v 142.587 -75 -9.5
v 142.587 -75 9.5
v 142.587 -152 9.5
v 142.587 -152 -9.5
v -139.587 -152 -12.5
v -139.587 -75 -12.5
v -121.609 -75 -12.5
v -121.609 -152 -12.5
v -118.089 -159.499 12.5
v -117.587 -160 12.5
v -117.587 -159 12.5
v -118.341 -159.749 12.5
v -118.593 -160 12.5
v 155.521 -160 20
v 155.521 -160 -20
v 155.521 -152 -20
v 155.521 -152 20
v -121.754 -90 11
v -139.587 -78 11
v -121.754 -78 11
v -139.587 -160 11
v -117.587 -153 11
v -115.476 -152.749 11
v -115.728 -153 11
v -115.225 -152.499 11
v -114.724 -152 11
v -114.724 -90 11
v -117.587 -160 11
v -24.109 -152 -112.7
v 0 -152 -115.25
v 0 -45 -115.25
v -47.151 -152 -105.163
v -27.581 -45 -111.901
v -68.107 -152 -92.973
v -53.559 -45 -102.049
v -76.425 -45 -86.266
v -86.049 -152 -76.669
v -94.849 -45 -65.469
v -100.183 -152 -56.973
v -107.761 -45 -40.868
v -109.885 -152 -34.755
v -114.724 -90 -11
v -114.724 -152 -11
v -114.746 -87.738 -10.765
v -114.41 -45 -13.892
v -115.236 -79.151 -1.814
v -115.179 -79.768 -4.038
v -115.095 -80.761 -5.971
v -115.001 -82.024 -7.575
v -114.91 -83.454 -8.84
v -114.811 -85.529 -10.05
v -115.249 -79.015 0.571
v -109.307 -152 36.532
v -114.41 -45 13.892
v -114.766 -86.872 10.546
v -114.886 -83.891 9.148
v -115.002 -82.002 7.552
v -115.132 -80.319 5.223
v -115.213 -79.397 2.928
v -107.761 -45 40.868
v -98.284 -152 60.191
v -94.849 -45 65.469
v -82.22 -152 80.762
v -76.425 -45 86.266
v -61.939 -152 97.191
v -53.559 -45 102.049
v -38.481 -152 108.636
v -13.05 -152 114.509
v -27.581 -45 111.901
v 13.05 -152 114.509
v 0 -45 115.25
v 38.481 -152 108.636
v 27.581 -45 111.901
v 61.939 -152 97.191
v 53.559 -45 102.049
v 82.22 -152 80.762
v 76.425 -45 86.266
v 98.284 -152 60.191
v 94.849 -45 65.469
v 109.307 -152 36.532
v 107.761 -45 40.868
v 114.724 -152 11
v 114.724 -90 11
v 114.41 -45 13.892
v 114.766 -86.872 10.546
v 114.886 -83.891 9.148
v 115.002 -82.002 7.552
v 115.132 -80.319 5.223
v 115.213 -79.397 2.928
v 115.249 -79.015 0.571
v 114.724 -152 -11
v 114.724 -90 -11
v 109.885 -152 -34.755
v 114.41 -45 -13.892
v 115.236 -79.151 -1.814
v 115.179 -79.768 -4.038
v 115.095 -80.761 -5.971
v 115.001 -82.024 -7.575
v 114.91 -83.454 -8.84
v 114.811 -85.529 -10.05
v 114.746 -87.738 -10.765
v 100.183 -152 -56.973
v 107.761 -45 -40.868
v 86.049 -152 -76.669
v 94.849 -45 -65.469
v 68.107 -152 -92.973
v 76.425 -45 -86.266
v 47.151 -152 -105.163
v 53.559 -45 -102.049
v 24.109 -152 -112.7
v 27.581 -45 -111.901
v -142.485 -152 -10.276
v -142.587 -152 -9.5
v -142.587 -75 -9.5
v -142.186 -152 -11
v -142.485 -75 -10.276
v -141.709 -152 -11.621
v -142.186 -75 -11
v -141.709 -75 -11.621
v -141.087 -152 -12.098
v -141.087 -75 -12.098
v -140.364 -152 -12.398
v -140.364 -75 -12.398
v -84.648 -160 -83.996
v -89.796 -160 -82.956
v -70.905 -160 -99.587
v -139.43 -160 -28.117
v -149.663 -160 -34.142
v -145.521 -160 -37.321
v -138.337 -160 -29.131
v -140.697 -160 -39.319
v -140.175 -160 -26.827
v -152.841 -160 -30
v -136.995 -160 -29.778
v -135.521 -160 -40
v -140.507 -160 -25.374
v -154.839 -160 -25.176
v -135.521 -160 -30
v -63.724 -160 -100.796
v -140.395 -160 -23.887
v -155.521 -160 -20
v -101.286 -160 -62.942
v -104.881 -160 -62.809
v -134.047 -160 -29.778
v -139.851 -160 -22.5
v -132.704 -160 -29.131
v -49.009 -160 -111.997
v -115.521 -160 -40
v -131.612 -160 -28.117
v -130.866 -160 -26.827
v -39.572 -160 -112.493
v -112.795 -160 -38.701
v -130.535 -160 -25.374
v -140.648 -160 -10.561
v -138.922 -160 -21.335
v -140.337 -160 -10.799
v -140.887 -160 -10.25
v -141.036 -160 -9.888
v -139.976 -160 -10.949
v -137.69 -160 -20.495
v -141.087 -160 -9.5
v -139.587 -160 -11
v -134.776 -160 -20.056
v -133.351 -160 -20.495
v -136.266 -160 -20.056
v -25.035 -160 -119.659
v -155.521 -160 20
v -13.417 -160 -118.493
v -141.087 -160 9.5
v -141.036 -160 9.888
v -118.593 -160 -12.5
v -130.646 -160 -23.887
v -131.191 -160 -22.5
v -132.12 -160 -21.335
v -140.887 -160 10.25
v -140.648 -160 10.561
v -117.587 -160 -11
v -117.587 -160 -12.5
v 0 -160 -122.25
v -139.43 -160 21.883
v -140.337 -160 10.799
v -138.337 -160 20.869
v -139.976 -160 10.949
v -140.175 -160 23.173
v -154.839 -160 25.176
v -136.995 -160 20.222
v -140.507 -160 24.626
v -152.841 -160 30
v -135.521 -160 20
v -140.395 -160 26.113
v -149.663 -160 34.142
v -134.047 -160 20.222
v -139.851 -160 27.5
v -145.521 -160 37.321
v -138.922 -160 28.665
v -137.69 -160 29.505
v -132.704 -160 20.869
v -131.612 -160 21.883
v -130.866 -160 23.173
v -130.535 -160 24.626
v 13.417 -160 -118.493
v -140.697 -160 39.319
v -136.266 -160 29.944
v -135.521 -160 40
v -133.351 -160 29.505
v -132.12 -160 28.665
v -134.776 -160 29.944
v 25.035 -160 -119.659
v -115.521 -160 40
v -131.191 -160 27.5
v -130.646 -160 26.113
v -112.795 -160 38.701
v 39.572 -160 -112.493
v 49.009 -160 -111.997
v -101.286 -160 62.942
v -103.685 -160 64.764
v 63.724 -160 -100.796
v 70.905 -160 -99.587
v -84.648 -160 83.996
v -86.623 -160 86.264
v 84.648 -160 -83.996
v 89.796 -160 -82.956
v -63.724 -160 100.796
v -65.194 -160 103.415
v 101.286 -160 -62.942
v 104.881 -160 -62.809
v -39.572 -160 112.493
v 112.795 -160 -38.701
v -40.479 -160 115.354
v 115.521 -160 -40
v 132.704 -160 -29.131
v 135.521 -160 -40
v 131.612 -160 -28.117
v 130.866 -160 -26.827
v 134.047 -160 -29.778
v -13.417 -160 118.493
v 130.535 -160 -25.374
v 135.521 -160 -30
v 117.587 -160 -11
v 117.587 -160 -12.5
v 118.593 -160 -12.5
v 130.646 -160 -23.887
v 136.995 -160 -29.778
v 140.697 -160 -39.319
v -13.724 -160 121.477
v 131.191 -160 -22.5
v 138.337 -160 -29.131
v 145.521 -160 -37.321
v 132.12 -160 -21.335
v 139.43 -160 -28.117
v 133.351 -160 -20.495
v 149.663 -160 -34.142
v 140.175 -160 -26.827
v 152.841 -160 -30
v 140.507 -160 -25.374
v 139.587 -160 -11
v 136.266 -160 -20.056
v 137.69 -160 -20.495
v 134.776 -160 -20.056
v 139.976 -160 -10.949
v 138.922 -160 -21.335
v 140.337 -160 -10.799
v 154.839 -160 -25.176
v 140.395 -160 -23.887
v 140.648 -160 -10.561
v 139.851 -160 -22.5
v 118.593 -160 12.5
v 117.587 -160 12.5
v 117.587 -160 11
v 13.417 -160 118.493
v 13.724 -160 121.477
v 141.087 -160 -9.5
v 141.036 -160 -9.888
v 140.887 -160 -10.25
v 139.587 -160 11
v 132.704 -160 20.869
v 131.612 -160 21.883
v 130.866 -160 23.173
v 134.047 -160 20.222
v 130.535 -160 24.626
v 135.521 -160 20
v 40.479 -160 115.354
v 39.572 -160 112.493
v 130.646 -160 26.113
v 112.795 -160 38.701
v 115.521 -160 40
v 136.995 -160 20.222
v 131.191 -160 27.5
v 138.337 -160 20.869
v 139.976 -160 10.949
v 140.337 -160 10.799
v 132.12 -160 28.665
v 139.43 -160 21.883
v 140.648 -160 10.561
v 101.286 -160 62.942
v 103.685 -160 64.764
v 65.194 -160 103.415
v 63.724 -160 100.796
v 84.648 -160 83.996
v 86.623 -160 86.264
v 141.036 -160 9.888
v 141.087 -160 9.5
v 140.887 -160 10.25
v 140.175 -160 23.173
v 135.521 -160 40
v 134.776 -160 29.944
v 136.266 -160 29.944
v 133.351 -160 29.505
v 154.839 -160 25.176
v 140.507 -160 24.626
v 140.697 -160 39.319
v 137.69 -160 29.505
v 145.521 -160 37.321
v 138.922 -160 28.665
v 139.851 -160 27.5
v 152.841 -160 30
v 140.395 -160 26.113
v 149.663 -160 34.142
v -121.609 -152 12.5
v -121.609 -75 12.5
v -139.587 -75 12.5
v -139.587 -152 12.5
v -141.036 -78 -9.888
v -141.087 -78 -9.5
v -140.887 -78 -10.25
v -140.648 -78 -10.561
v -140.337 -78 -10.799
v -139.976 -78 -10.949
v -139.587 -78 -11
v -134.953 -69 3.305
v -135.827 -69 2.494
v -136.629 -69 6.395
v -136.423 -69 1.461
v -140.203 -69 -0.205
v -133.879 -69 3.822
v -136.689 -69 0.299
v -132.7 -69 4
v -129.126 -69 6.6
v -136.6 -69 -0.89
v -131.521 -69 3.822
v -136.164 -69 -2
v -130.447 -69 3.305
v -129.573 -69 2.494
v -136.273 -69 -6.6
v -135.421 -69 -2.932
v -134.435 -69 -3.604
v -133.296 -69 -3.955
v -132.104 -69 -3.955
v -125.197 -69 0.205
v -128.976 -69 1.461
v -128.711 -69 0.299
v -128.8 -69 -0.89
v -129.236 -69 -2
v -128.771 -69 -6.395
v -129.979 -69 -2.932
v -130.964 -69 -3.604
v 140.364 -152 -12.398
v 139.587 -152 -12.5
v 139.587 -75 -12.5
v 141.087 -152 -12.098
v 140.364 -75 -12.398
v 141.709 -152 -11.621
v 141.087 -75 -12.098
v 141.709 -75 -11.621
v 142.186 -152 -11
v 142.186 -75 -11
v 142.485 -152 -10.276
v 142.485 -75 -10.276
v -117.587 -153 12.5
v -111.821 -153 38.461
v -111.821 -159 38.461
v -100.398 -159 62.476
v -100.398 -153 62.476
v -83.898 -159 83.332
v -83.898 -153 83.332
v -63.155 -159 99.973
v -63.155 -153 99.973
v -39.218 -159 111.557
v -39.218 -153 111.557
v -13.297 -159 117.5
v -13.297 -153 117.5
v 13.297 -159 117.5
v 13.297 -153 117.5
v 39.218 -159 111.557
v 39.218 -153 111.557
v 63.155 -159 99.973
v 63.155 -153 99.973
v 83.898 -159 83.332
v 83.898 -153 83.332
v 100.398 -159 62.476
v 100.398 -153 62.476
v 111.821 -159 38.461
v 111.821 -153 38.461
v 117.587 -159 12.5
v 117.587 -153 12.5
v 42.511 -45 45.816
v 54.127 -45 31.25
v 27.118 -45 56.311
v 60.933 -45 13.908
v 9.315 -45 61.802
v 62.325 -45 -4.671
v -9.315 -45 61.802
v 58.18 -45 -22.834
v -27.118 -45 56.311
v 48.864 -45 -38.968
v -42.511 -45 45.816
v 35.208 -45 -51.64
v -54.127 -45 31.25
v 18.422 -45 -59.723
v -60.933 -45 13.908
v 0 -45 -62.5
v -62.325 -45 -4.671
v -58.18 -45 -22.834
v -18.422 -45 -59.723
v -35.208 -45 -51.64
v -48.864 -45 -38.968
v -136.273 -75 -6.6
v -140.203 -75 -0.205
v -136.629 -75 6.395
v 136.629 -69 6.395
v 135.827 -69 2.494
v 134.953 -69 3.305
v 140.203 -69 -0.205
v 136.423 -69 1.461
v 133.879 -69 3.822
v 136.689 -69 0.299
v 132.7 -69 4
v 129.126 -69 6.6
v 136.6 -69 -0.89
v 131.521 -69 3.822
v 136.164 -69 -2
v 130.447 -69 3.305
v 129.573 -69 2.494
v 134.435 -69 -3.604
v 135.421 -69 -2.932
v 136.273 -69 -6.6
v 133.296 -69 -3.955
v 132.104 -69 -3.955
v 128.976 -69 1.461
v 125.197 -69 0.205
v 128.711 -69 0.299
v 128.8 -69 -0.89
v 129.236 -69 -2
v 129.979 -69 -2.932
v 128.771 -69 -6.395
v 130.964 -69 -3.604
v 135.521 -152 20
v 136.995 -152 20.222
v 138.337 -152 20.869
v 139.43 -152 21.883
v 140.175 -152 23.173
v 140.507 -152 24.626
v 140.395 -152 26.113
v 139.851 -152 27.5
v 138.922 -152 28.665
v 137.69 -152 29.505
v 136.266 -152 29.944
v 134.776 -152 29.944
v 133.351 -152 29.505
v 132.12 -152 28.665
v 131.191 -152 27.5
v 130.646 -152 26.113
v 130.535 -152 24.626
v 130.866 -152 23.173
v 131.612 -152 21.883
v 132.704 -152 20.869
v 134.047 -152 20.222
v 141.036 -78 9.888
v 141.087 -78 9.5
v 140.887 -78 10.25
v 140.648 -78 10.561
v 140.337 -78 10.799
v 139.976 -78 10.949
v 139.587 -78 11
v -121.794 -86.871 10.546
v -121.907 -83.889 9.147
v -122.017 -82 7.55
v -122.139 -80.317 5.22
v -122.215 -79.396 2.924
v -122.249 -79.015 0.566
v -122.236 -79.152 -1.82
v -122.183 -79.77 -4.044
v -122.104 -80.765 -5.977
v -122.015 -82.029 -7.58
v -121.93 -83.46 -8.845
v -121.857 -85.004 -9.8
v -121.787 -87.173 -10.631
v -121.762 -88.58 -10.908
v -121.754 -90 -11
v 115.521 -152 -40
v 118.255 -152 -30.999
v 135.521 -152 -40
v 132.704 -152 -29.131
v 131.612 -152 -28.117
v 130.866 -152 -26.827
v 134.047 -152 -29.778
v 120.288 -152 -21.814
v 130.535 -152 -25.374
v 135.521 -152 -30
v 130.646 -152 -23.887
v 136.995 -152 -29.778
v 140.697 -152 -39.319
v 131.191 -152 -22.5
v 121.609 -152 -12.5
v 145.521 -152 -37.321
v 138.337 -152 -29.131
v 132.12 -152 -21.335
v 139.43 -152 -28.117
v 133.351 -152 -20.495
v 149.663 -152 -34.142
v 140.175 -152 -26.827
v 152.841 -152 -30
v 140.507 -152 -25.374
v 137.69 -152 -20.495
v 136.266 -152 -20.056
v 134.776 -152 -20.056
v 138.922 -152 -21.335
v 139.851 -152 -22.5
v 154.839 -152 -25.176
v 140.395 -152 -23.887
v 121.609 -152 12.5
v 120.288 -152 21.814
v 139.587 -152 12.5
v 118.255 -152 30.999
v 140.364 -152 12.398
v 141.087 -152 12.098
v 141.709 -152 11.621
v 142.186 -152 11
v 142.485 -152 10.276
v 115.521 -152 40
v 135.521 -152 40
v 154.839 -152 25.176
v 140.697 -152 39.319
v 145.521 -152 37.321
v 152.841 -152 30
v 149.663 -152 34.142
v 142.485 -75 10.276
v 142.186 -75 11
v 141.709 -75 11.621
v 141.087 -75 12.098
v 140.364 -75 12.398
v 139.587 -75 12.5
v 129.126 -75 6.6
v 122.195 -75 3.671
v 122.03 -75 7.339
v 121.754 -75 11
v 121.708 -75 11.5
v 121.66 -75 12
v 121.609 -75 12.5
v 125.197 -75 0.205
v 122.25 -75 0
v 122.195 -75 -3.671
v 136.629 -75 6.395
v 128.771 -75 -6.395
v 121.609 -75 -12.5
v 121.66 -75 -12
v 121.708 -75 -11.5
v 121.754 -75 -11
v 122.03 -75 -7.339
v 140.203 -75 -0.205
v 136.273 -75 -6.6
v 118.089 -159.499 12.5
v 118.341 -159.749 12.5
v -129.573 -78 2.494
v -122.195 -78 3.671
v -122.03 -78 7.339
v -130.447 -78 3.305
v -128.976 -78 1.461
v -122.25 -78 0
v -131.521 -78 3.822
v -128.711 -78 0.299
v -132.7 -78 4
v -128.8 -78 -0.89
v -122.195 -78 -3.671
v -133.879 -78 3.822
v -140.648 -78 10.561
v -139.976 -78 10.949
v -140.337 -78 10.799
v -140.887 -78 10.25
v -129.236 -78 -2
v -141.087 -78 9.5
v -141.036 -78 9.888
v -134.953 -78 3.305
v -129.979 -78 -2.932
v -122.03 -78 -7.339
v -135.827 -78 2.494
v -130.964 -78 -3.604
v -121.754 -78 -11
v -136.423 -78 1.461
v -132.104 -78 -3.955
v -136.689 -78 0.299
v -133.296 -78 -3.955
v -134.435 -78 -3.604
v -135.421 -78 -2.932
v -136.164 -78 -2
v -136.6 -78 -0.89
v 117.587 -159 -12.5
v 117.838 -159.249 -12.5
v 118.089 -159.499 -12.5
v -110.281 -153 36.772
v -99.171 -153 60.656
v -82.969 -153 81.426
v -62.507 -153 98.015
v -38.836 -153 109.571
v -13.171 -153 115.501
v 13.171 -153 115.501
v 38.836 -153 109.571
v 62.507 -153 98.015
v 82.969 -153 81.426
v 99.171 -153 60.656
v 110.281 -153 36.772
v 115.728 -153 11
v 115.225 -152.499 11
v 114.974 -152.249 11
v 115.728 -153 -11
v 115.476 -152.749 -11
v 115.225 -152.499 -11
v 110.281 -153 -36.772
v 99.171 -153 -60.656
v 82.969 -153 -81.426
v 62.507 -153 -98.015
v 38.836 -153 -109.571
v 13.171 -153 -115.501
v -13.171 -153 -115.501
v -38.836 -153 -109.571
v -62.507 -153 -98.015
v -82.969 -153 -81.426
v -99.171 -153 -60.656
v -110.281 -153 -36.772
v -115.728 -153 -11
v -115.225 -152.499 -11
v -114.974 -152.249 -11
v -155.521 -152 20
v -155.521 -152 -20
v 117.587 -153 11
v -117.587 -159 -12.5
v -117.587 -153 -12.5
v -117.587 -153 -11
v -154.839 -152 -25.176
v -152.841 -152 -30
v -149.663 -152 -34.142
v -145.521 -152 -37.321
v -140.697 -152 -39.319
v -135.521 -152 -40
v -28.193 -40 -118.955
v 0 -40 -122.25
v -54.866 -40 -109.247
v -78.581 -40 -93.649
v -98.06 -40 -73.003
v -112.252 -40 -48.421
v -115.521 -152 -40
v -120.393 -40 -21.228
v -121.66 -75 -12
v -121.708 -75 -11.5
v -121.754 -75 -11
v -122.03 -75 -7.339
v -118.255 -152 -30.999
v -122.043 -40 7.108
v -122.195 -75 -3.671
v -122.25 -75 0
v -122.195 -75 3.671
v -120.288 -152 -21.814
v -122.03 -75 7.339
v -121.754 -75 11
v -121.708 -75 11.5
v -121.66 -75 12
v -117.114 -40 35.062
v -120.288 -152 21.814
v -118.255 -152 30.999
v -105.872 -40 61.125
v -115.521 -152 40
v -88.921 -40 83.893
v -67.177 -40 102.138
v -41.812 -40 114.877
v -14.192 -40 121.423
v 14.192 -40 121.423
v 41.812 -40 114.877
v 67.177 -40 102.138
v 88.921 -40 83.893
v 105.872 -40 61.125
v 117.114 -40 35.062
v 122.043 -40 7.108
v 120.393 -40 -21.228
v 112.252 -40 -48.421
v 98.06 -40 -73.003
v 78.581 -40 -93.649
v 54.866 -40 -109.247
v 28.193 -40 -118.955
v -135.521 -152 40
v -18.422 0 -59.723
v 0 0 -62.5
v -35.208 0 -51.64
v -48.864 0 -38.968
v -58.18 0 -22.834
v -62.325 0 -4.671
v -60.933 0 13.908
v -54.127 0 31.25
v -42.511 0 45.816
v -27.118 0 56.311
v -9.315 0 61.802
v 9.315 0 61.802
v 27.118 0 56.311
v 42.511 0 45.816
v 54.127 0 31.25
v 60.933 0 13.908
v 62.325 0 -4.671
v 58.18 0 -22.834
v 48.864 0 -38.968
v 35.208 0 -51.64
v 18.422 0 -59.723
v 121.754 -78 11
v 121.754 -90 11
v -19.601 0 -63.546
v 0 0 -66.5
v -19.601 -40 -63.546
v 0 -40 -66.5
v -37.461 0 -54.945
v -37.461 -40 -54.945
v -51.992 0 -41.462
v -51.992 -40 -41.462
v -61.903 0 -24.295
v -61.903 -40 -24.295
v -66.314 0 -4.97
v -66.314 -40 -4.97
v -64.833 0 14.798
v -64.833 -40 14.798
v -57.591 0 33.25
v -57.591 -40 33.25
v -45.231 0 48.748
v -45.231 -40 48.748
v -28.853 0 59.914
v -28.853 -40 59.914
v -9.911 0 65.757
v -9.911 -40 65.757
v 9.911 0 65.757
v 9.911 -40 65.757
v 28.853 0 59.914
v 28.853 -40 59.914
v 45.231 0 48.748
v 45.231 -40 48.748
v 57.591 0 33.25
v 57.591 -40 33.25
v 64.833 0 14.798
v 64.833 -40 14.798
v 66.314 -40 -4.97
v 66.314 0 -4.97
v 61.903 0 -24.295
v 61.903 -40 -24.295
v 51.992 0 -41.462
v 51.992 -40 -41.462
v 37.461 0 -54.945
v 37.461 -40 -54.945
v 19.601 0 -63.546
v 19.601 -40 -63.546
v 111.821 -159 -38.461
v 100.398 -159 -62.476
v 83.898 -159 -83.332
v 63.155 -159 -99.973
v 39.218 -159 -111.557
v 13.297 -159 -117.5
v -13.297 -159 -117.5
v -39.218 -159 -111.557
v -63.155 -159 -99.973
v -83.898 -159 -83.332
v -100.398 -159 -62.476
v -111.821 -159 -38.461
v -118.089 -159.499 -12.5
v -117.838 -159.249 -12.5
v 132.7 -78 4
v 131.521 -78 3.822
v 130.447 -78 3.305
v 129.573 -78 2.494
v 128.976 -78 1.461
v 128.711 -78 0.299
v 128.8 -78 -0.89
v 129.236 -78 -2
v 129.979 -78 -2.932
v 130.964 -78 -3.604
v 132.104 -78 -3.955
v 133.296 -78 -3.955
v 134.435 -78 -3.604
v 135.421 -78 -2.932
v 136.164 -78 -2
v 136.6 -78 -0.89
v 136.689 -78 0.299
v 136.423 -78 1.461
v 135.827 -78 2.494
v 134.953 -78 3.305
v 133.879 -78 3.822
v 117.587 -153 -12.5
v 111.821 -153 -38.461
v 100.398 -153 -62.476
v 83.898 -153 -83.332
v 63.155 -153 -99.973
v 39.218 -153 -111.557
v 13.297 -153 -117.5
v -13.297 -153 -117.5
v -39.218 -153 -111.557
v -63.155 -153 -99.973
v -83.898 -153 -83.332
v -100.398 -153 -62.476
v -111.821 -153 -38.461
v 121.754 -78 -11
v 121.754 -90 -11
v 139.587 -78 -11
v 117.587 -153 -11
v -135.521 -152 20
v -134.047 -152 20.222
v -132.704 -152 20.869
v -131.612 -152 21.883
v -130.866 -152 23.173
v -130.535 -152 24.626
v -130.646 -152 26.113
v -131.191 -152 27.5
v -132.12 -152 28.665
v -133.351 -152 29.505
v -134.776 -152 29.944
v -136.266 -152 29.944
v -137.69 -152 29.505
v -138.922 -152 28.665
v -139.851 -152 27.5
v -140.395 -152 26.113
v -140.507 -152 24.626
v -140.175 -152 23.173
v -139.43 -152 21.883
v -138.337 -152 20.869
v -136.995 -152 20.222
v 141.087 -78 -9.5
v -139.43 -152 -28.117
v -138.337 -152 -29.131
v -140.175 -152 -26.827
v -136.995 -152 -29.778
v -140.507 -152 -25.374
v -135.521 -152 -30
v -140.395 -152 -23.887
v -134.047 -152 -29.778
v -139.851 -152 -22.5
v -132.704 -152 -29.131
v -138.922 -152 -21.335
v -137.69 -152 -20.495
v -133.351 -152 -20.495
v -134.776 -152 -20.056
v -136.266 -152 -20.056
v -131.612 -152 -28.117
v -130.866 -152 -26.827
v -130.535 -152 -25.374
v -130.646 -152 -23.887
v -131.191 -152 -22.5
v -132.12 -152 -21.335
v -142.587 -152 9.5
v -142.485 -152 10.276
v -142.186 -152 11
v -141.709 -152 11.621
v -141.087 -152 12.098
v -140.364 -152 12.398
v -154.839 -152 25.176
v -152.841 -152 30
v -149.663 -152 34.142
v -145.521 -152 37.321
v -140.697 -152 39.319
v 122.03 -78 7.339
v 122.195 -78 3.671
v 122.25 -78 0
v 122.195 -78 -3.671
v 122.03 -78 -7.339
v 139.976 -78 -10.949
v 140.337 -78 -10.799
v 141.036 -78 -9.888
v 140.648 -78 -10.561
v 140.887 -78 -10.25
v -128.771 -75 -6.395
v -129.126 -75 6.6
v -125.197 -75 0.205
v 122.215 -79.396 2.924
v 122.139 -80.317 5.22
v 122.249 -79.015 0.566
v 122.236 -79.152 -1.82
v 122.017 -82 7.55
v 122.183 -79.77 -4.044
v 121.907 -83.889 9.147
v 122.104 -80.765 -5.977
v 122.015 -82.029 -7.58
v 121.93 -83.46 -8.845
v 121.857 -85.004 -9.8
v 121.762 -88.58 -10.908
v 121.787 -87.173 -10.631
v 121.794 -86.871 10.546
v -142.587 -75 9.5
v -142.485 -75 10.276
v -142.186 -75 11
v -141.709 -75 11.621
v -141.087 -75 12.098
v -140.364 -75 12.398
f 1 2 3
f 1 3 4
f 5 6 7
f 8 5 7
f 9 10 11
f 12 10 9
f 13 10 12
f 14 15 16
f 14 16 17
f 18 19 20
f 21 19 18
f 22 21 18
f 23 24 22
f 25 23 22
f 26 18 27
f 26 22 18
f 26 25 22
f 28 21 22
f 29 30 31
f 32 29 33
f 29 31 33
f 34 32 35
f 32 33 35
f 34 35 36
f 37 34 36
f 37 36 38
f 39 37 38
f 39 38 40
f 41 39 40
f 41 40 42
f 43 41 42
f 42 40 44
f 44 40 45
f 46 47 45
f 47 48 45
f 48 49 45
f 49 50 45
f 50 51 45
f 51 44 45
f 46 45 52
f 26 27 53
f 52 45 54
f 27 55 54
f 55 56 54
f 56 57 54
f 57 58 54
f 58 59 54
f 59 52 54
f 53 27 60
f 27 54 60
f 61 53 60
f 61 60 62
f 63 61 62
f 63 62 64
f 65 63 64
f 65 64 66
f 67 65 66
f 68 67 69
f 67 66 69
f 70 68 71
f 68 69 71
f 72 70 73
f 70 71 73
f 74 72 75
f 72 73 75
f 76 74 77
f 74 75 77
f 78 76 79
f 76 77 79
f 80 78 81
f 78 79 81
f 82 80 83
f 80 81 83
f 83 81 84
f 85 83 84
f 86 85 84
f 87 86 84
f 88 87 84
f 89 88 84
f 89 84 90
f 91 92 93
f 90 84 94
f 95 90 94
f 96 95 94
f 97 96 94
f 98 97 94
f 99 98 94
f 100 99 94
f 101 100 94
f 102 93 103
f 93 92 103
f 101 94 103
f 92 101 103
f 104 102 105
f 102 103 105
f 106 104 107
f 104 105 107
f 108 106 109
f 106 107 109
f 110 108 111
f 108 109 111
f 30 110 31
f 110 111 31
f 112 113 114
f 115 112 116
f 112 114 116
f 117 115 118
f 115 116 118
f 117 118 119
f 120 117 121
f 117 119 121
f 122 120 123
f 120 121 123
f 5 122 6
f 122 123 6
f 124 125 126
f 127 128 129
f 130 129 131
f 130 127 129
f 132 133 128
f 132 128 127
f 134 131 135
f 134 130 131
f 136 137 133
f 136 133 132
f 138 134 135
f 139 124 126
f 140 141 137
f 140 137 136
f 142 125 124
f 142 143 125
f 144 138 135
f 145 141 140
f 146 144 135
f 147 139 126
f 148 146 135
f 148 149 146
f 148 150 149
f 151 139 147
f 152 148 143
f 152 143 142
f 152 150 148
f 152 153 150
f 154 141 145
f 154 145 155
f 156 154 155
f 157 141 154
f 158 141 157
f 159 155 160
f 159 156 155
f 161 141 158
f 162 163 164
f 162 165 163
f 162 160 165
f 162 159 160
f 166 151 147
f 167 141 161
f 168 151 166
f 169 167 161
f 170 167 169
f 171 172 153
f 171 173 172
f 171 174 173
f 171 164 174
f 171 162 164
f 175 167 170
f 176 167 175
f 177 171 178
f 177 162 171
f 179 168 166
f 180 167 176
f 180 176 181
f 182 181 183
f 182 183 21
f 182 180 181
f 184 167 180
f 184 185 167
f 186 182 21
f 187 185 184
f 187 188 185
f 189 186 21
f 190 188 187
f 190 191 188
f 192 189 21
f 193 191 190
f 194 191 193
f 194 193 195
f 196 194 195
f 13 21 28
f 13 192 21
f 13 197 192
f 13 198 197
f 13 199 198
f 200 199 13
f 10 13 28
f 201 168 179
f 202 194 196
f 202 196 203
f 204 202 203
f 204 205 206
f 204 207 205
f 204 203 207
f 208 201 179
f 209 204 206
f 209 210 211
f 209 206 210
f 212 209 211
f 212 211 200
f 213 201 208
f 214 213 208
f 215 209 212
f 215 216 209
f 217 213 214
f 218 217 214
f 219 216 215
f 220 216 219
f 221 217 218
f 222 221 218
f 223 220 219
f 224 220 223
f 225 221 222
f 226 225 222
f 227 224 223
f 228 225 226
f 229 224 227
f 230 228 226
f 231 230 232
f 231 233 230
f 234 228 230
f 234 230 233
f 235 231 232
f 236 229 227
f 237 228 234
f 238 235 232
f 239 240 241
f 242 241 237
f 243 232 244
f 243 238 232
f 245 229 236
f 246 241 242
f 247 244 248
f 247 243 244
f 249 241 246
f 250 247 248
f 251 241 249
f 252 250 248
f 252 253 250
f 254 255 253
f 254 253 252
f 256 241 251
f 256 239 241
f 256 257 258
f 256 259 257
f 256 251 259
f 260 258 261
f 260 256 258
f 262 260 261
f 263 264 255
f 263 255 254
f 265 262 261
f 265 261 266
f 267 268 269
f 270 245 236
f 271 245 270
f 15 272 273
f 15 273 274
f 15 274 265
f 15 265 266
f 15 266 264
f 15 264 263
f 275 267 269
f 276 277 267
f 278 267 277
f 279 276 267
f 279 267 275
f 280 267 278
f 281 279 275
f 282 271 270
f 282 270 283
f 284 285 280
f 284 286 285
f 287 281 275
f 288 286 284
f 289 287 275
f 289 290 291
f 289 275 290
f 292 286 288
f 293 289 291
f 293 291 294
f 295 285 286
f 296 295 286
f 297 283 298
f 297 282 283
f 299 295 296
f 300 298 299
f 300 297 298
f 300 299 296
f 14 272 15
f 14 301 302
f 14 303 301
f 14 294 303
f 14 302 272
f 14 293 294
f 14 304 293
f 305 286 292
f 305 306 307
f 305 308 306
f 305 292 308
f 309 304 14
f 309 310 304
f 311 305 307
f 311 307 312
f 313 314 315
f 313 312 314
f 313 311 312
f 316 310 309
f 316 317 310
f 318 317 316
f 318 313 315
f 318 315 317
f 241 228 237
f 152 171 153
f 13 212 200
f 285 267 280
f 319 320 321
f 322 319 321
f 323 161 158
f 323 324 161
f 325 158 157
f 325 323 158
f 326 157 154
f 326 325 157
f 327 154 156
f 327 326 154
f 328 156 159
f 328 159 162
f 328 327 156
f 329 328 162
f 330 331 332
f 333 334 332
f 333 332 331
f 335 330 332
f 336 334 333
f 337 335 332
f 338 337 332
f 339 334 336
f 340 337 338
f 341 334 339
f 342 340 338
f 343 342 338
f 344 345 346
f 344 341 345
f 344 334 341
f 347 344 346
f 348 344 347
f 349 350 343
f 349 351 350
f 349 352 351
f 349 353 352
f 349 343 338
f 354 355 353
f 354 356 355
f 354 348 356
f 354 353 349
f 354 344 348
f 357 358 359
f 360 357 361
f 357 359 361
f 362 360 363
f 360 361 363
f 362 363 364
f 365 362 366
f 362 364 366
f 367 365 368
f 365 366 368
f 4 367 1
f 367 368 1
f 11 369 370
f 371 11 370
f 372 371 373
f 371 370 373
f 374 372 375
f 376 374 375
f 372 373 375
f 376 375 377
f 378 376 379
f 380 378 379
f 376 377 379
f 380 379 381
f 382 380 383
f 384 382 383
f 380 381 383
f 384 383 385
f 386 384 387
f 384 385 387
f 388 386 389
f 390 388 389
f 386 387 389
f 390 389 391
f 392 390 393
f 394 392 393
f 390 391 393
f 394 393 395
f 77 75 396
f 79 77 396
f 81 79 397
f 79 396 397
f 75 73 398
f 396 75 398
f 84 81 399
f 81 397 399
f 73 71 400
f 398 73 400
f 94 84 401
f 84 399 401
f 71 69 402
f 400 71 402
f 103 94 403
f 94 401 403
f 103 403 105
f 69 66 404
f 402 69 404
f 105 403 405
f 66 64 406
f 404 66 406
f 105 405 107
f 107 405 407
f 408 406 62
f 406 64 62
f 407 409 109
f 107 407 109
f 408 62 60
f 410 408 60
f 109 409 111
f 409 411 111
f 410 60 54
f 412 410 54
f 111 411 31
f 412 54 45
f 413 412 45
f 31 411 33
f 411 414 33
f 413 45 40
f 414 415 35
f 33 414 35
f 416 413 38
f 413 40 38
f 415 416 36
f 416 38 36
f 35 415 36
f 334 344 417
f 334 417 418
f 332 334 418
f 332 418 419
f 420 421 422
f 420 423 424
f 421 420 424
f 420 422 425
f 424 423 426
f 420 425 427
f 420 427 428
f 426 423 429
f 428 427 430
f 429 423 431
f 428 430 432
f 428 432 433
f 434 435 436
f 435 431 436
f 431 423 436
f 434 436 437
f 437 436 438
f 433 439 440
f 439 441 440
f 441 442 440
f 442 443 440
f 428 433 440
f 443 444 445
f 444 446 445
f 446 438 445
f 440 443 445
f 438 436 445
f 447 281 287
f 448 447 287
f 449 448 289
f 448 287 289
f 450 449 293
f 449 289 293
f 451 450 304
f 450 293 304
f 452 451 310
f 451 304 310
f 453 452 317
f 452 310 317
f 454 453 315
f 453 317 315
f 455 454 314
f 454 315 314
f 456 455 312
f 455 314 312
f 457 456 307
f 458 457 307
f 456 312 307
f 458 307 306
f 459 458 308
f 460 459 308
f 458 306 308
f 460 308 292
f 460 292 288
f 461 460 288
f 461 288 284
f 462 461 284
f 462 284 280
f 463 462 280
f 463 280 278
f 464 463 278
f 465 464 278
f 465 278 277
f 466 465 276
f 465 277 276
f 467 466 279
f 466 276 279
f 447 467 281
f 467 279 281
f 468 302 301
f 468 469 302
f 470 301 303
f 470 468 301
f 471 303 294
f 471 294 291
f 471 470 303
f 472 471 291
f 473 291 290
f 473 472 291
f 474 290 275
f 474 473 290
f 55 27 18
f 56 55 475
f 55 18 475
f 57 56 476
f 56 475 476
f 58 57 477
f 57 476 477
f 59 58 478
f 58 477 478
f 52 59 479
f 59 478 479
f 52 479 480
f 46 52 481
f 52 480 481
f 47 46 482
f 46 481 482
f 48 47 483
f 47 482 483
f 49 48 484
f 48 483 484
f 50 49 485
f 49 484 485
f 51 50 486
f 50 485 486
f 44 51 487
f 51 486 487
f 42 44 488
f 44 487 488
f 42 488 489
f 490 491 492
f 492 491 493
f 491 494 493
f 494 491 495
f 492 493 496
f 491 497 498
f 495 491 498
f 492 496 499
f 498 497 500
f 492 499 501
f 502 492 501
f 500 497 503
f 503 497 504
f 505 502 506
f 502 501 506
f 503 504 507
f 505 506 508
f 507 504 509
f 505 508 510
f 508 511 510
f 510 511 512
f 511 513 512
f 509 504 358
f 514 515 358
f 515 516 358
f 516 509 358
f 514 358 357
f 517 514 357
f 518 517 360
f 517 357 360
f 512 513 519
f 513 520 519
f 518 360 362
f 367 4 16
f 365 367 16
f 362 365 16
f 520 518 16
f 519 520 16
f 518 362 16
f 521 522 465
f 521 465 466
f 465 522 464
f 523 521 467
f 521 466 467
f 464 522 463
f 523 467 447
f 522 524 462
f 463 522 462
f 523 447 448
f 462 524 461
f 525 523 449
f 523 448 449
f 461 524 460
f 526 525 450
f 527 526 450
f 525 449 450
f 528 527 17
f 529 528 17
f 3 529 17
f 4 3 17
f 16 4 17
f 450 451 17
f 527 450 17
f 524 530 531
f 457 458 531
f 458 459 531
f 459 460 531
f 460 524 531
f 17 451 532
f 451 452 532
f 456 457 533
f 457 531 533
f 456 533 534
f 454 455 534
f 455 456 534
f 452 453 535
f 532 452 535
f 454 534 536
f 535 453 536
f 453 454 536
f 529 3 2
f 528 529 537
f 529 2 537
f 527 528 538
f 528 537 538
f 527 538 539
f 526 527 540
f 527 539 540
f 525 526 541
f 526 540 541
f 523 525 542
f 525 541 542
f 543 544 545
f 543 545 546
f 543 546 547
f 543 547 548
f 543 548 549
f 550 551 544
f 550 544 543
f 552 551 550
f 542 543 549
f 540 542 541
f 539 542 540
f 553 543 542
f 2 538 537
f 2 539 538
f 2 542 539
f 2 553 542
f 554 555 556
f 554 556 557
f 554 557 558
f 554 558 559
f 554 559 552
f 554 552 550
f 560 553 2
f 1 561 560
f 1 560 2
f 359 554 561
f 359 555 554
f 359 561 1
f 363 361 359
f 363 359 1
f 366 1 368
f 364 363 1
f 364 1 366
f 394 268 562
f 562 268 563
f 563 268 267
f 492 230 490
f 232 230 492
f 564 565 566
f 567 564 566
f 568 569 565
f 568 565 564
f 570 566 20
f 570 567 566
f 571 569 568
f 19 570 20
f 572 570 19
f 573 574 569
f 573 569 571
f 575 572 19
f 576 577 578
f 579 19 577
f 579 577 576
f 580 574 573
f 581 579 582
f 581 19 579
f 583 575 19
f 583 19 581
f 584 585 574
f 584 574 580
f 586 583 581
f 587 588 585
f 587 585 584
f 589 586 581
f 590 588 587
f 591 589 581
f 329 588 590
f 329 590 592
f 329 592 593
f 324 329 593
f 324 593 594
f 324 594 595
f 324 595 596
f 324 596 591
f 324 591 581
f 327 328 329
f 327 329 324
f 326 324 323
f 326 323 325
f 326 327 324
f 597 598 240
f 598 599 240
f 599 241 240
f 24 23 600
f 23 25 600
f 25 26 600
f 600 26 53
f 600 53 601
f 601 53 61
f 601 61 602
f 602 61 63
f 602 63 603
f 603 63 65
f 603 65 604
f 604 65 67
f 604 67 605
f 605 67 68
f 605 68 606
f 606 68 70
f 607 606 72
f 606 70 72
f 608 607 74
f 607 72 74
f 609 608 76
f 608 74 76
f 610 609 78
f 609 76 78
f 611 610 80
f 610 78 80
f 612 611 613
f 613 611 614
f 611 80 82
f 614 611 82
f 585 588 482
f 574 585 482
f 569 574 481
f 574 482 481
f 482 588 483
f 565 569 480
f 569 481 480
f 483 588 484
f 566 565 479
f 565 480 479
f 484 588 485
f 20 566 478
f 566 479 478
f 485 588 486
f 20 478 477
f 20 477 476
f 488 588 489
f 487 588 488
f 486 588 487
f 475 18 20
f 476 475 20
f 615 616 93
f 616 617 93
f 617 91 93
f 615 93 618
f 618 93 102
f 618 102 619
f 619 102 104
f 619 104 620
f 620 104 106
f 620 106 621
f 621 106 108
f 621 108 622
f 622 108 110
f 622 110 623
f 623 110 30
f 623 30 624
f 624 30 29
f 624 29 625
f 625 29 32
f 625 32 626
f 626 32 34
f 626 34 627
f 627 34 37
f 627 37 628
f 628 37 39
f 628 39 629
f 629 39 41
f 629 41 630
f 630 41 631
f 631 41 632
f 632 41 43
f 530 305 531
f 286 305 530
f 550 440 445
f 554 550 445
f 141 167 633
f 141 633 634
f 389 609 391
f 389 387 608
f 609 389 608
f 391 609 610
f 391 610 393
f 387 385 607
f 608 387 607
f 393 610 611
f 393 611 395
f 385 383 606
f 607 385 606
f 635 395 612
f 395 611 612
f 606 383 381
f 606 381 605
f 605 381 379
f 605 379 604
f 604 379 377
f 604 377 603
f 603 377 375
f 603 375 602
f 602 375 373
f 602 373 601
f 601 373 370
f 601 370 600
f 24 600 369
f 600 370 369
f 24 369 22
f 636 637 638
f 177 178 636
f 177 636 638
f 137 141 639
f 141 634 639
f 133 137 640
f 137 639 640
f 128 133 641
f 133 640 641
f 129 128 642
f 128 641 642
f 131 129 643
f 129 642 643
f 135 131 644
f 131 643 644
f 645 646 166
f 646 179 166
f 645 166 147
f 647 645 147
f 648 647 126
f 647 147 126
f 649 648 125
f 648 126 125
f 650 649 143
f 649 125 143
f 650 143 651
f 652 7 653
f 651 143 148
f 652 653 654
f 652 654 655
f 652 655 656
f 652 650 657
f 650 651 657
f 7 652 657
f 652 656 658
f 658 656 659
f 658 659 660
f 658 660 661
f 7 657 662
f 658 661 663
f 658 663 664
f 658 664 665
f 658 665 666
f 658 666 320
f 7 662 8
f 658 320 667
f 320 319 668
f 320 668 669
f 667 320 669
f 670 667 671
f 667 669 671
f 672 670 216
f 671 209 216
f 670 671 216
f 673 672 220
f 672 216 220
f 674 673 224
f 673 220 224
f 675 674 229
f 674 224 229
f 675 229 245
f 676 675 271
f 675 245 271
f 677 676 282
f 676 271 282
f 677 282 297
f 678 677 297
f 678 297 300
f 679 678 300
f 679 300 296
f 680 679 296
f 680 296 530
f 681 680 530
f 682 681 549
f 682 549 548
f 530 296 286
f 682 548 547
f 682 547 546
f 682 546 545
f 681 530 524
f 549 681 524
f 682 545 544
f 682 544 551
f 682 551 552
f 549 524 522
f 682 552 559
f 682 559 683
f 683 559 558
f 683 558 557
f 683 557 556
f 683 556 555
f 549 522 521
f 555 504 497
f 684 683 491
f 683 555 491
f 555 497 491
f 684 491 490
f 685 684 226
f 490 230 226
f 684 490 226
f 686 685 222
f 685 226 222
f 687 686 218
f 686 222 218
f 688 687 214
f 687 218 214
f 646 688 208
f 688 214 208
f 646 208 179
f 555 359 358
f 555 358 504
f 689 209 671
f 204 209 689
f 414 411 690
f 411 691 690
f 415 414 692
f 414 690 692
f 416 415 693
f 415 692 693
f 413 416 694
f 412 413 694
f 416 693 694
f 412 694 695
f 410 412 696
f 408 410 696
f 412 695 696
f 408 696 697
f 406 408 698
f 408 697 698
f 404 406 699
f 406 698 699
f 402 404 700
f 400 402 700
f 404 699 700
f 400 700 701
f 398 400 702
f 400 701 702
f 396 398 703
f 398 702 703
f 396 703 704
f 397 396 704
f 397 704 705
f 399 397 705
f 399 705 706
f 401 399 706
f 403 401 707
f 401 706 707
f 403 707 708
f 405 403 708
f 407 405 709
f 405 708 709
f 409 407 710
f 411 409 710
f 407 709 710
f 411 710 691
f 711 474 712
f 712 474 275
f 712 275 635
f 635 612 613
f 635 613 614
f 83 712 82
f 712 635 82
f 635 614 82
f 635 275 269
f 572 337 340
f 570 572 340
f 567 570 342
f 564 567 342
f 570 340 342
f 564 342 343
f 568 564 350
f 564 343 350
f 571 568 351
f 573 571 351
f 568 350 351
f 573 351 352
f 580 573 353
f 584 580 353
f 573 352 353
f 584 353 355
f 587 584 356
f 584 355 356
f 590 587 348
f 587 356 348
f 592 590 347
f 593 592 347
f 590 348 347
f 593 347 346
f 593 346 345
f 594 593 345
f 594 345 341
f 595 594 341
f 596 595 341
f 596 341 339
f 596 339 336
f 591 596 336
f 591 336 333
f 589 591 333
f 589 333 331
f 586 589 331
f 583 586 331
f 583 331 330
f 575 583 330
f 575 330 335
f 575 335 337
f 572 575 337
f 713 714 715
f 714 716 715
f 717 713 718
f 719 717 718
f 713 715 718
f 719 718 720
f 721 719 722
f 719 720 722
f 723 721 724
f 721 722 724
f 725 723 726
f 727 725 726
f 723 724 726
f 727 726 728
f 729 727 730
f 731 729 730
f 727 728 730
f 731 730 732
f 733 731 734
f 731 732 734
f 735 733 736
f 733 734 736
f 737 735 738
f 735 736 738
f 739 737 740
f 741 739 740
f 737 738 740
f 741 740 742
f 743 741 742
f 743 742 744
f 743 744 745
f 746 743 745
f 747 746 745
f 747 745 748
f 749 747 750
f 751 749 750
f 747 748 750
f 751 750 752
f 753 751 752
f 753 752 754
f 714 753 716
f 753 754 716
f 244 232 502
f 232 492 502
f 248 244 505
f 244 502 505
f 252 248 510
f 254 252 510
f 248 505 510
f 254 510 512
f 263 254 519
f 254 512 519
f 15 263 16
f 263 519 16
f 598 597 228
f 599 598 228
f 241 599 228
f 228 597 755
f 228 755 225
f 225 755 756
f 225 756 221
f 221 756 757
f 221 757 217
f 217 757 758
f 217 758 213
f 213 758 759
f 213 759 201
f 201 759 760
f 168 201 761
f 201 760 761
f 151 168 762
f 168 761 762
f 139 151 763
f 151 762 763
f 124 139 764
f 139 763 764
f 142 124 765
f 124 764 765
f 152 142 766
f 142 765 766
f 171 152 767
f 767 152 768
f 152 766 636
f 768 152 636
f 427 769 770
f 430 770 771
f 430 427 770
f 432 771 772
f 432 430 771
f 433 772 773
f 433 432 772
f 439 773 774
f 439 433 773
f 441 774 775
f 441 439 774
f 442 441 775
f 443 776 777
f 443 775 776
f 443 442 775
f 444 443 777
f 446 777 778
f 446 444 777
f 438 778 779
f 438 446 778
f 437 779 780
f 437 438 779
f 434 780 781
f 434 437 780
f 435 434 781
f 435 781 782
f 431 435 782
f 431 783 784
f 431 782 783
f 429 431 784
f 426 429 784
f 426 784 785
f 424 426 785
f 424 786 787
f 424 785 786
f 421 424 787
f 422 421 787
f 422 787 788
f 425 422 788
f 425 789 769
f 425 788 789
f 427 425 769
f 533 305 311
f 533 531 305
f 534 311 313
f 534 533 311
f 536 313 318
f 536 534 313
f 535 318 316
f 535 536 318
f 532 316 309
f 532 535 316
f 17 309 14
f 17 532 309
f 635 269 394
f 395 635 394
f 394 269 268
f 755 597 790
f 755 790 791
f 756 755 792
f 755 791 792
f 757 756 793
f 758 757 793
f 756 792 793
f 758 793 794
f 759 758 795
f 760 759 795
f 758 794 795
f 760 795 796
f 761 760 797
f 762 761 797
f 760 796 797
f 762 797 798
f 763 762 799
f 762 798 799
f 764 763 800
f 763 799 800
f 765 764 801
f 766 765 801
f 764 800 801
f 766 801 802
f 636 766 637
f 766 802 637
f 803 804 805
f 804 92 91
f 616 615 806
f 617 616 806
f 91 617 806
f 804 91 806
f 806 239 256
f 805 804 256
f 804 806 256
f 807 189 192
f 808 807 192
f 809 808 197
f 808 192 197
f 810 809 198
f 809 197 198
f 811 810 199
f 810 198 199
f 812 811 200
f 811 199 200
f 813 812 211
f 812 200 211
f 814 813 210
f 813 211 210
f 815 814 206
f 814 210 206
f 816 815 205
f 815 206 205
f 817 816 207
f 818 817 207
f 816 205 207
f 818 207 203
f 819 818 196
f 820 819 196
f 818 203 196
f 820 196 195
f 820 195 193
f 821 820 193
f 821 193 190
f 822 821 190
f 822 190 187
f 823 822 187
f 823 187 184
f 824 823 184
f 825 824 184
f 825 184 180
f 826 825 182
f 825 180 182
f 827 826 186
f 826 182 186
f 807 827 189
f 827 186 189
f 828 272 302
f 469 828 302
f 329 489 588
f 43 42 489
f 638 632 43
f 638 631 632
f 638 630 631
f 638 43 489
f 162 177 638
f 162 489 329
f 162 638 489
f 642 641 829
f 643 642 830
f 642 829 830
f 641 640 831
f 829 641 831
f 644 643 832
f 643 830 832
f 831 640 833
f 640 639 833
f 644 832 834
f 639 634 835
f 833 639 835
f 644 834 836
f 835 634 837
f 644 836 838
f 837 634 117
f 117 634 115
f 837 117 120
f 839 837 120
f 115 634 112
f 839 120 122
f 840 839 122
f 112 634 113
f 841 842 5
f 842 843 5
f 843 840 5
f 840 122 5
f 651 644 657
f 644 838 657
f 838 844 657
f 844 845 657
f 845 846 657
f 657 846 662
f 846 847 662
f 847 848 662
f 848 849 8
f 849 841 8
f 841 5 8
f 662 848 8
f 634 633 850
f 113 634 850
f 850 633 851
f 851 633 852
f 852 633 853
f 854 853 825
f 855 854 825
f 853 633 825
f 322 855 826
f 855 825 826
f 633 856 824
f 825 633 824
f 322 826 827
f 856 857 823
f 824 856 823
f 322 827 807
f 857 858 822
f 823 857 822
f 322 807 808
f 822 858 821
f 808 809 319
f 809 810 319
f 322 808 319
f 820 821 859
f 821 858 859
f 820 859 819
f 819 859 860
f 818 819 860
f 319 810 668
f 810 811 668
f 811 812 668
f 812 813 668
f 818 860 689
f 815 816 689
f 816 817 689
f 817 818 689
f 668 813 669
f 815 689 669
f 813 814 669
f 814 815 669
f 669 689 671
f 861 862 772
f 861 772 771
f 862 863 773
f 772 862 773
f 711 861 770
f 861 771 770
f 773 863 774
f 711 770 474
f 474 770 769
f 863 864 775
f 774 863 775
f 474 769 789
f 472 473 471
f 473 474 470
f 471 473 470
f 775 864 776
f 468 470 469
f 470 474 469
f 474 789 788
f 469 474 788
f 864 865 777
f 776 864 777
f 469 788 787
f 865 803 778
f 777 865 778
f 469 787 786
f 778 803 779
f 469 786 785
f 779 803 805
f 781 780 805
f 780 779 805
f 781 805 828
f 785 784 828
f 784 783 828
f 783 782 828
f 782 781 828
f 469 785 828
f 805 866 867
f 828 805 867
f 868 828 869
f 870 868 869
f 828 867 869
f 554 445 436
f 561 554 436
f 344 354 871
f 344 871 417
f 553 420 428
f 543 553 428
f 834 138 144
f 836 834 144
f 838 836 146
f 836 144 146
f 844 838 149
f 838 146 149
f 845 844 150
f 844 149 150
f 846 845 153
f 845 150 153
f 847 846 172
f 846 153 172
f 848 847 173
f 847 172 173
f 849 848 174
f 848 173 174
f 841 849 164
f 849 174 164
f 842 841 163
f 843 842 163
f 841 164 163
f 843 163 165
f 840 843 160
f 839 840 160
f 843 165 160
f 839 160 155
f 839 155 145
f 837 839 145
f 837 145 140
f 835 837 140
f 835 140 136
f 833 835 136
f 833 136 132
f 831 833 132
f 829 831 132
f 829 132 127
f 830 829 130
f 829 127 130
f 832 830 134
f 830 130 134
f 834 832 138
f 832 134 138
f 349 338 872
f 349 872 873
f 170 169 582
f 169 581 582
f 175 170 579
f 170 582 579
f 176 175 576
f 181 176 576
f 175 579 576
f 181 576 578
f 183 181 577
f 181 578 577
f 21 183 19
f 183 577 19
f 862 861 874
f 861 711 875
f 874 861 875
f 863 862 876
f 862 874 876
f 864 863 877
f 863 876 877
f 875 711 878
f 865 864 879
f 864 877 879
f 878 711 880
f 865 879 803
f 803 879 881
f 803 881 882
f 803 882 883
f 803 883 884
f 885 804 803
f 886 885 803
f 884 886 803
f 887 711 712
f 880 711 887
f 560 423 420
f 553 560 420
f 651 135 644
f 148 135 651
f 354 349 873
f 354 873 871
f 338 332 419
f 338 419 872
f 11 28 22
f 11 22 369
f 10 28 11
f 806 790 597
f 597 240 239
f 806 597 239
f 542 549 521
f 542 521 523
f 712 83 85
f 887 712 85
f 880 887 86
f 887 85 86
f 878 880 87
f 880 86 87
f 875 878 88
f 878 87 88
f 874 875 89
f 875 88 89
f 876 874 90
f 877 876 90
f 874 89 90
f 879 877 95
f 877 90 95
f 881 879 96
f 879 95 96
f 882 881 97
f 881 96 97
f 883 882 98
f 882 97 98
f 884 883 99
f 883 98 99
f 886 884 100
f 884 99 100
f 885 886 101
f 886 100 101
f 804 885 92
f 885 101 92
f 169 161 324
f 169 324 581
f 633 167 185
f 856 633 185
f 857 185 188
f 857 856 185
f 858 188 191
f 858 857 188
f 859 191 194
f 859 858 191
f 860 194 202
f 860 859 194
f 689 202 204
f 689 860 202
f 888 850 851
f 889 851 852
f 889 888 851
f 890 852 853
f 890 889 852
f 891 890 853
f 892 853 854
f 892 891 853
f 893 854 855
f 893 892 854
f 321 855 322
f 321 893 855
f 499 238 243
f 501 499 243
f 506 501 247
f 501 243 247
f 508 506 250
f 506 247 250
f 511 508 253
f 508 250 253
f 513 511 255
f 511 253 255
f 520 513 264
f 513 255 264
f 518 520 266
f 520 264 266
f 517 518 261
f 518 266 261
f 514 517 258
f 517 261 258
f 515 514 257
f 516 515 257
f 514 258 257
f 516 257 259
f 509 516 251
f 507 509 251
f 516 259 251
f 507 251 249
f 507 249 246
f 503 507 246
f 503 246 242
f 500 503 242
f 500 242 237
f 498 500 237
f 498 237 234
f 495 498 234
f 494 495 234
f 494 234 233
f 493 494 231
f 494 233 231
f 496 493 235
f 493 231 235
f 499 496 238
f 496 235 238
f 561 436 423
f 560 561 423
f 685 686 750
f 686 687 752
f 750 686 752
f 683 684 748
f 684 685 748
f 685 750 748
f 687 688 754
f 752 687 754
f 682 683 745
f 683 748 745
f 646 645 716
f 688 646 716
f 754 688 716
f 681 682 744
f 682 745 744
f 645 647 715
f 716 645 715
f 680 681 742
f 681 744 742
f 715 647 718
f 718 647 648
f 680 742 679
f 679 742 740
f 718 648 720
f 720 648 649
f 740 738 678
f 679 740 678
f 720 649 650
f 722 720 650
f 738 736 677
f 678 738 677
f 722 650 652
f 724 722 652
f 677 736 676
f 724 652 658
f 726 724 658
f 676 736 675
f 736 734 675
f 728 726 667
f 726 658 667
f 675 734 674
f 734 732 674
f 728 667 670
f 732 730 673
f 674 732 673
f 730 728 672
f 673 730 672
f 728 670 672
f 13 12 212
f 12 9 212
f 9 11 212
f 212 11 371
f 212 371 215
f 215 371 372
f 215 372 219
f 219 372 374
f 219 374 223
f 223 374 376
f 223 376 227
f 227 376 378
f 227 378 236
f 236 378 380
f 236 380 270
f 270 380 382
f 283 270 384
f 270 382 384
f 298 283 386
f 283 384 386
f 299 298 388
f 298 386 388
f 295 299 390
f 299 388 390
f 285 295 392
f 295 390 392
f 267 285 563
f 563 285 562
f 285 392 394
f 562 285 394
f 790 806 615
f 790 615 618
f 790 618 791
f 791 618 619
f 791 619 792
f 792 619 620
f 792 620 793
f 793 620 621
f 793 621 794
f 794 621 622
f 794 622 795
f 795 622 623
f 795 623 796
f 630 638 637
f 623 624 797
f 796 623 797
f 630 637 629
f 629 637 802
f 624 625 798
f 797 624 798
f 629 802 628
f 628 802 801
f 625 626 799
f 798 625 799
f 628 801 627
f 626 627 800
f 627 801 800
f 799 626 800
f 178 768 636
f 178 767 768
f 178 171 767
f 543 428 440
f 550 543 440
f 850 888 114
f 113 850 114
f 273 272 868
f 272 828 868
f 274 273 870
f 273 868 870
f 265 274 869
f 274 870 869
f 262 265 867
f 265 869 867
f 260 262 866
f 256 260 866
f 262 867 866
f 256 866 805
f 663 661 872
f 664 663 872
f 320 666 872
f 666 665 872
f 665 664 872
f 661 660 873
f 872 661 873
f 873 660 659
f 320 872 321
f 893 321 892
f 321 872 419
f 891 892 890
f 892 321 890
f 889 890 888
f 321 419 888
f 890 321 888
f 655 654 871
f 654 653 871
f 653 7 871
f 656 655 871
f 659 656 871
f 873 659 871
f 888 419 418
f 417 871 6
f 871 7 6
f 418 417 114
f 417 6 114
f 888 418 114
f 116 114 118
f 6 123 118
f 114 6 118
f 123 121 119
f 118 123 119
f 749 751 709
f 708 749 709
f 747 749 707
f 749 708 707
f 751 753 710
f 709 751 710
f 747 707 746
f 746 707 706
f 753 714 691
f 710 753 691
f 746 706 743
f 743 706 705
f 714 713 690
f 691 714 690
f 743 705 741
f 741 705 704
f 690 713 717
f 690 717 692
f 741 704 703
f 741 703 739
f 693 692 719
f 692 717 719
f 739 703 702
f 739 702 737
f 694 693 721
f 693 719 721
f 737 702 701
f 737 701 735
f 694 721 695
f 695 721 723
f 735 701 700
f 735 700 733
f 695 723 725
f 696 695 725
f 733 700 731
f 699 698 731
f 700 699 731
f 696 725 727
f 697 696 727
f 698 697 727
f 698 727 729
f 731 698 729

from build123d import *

# Parameters (mm, degrees)
CHAMFER1_SIZE           = 1
CUT_EXTRUDE1_DEPTH      = 236.563420335
CUT_EXTRUDE1_DEPTH_BACK = 236.563420335
BOSS_EXTRUDE2_START     = -160
BOSS_EXTRUDE2_DEPTH     = 85
BOSS_EXTRUDE3_START     = -3
BOSS_EXTRUDE3_DEPTH     = 3
FILLET1_R               = 1.5
FILLET2_R               = 3
FILLET1_OF_MIRROR1_R    = 1.5
FILLET2_OF_MIRROR1_R    = 3
SKETCH6_R               = 5
BOSS_EXTRUDE4_DEPTH     = 8
FILLET3_R               = 20
SKETCH7_R               = 4
CUT_EXTRUDE2_DEPTH      = 10
BOSS_EXTRUDE5_START     = 6
SKETCH8_R               = 4
BOSS_EXTRUDE5_DEPTH     = 6


with BuildPart() as part:
    # Sketch1 → Revolve1 (revolve)
    with BuildSketch(Plane.XY, mode=Mode.PRIVATE) as revolve1_sk:
        Polygon((-122.25, -160), (-118.25, -160), (-118.25, -153), (-115.25, -153), (-115.25, -45), (-62.5, -45), (-62.5, 0), (-66.5, 0), (-66.5, -40), (-122.25, -40), align=None)
    revolve(revolve1_sk.sketch.rotate(Axis((0, -155, 0), (0, 1, 0)), 270), axis=Axis((0, -155, 0), (0, 1, 0)))

    # Chamfer1
    chamfer1_edges = [part.edges().sort_by_distance(p)[0] for p in [
        (0, -153, 115.25),
        (0, -160, 118.25),
    ]]
    chamfer(chamfer1_edges, length=CHAMFER1_SIZE)

    # Sketch3 → Cut-Extrude1 (cut, two sides: drawn at the far end of the back side and taken through both)
    with BuildSketch(Plane(origin=(0, 0, 0), x_dir=(0, 0, -1), z_dir=(1, 0, 0)).offset(-CUT_EXTRUDE1_DEPTH_BACK)):
        with BuildLine():
            Line((-11, -160), (-11, -90))
            ThreePointArc((-11, -90), (0, -79), (11, -90))
            Line((11, -90), (11, -160))
            ThreePointArc((11, -160), (0, -171), (-11, -160))
        make_face()
    extrude(amount=CUT_EXTRUDE1_DEPTH + CUT_EXTRUDE1_DEPTH_BACK, mode=Mode.SUBTRACT)

    # Sketch2 → Boss-Extrude2 (add)
    with BuildSketch(Plane(origin=(34.652885487, 0, -427.94626462), x_dir=(1, 0, 0), z_dir=(0, 1, 0)).offset(BOSS_EXTRUDE2_START)):
        Polygon((107.934581958, -415.44626462), (82.934581958, -415.44626462), (82.934581958, -416.94626462), (106.434581958, -416.94626462), (106.434581958, -438.94626462), (82.934581958, -438.94626462), (82.934581958, -440.44626462), (107.934581958, -440.44626462), align=None)
    boss_extrude2 = extrude(amount=BOSS_EXTRUDE2_DEPTH)

    # Sketch5 → Boss-Extrude3 (add)
    with BuildSketch(Plane(origin=(0, -75, 0), x_dir=(1, 0, 0), z_dir=(0, 1, 0)).offset(BOSS_EXTRUDE3_START)):
        with BuildLine():
            Line((141.087467444, -11), (141.087467444, 11))
            Line((141.087467444, 11), (121.754106707, 11))
            ThreePointArc((121.754106707, 11), (122.125963752, 5.505586031), (122.25, 0))
            ThreePointArc((122.25, 0), (122.125963752, -5.505586031), (121.754106707, -11))
            Line((121.754106707, -11), (141.087467444, -11))
        make_face()
    boss_extrude3 = extrude(amount=BOSS_EXTRUDE3_DEPTH)

    # Fillet1
    fillet1_edges = [part.edges().sort_by_distance(p)[0] for p in [
        (141.087467444, -119, 11),
        (141.087467444, -119, -11),
    ]]
    fillet(fillet1_edges, radius=FILLET1_R)

    # Fillet2
    fillet2_edges = [part.edges().sort_by_distance(p)[0] for p in [
        (142.587467444, -117.5, 12.5),
        (142.587467444, -117.5, -12.5),
    ]]
    fillet(fillet2_edges, radius=FILLET2_R)

    # Mirror1: Boss-Extrude2, Boss-Extrude3 across plane
    add(boss_extrude2.mirror(Plane(origin=(0, 0, 0), x_dir=(0, 0, 1), z_dir=(1, 0, 0))))
    add(boss_extrude3.mirror(Plane(origin=(0, 0, 0), x_dir=(0, 0, 1), z_dir=(1, 0, 0))))

    # Fillet1 of Mirror1
    fillet1_of_mirror1_edges = [part.edges().sort_by_distance(p)[0] for p in [
        (-141.087467444, -119, 11),
        (-141.087467444, -119, -11),
    ]]
    fillet(fillet1_of_mirror1_edges, radius=FILLET1_OF_MIRROR1_R)

    # Fillet2 of Mirror1
    fillet2_of_mirror1_edges = [part.edges().sort_by_distance(p)[0] for p in [
        (-142.587467444, -117.5, 12.5),
        (-142.587467444, -117.5, -12.5),
    ]]
    fillet(fillet2_of_mirror1_edges, radius=FILLET2_OF_MIRROR1_R)

    # Sketch6 → Boss-Extrude4 (add)
    # profile 1 of 2: a face of its own
    with BuildSketch(Plane.XZ.offset(160)):
        with BuildLine():
            Line((-155.520831455, 40), (-155.520831455, -40))
            Line((-155.520831455, -40), (-115.520831455, -40))
            ThreePointArc((-115.520831455, -40), (-119.359678094, -26.425929413), (-121.609261572, -12.5))
            Line((-121.609261572, -12.5), (-139.587467444, -12.5))
            ThreePointArc((-139.587467444, -12.5), (-141.708787788, -11.621320344), (-142.587467444, -9.5))
            Line((-142.587467444, -9.5), (-142.587467444, 9.5))
            ThreePointArc((-142.587467444, 9.5), (-141.708787788, 11.621320344), (-139.587467444, 12.5))
            Line((-139.587467444, 12.5), (-121.609261572, 12.5))
            ThreePointArc((-121.609261572, 12.5), (-119.359678094, 26.425929413), (-115.520831455, 40))
            Line((-115.520831455, 40), (-155.520831455, 40))
        make_face()
        with Locations(Location((-135.520831455, -25, 0), (0, 0, 270))):
            Circle(SKETCH6_R, mode=Mode.SUBTRACT)
        with Locations(Location((-135.520831455, 25, 0), (0, 0, 270))):
            Circle(SKETCH6_R, mode=Mode.SUBTRACT)
    # profile 2 of 2: a face of its own
    with BuildSketch(Plane.XZ.offset(160)):
        with BuildLine():
            ThreePointArc((121.609261572, -12.5), (119.359678094, -26.425929413), (115.520831455, -40))
            Line((115.520831455, -40), (155.520831455, -40))
            Line((155.520831455, -40), (155.520831455, 40))
            Line((155.520831455, 40), (115.520831455, 40))
            ThreePointArc((115.520831455, 40), (119.359678094, 26.425929413), (121.609261572, 12.5))
            Line((121.609261572, 12.5), (139.587467444, 12.5))
            ThreePointArc((139.587467444, 12.5), (141.708787788, 11.621320344), (142.587467444, 9.5))
            Line((142.587467444, 9.5), (142.587467444, -9.5))
            ThreePointArc((142.587467444, -9.5), (141.708787788, -11.621320344), (139.587467444, -12.5))
            Line((139.587467444, -12.5), (121.609261572, -12.5))
        make_face()
        with Locations(Location((135.520831455, -25, 0), (0, 0, 270))):
            Circle(SKETCH6_R, mode=Mode.SUBTRACT)
        with Locations(Location((135.520831455, 25, 0), (0, 0, 270))):
            Circle(SKETCH6_R, mode=Mode.SUBTRACT)
    extrude(amount=-BOSS_EXTRUDE4_DEPTH)

    # Fillet3
    fillet3_edges = [part.edges().sort_by_distance(p)[0] for p in [
        (-155.520831455, -156, 40),
        (-155.520831455, -156, -40),
        (155.520831455, -156, -40),
        (155.520831455, -156, 40),
    ]]
    fillet(fillet3_edges, radius=FILLET3_R)

    # Sketch7 → Cut-Extrude2 (cut)
    with BuildSketch(Plane(origin=(0, -75, 0), x_dir=(1, 0, 0), z_dir=(0, 1, 0))):
        with Locations(Location((-132.699855766, 0, 0), (0, 0, 270))):
            Circle(SKETCH7_R)
    cut_extrude2 = extrude(amount=-CUT_EXTRUDE2_DEPTH, mode=Mode.SUBTRACT)

    # Sketch8 → Boss-Extrude5 (add)
    with BuildSketch(Plane(origin=(0, -75, 0), x_dir=(1, 0, 0), z_dir=(0, 1, 0)).offset(BOSS_EXTRUDE5_START)):
        Polygon((-128.770701066, 6.394925854), (-136.273446661, 6.600210713), (-140.202601361, 0.205284859), (-136.629010467, -6.394925854), (-129.126264872, -6.600210713), (-125.197110172, -0.205284859), align=None)
        with Locations(Location((-132.699855766, 0, 0), (0, 0, 270))):
            Circle(SKETCH8_R, mode=Mode.SUBTRACT)
    boss_extrude5 = extrude(amount=-BOSS_EXTRUDE5_DEPTH)

    # Mirror2: Cut-Extrude2, Boss-Extrude5 across plane
    add(cut_extrude2.mirror(Plane(origin=(0, 0, 0), x_dir=(0, 0, 1), z_dir=(1, 0, 0))), mode=Mode.SUBTRACT)
    add(boss_extrude5.mirror(Plane(origin=(0, 0, 0), x_dir=(0, 0, 1), z_dir=(1, 0, 0))))


solid = part.part
